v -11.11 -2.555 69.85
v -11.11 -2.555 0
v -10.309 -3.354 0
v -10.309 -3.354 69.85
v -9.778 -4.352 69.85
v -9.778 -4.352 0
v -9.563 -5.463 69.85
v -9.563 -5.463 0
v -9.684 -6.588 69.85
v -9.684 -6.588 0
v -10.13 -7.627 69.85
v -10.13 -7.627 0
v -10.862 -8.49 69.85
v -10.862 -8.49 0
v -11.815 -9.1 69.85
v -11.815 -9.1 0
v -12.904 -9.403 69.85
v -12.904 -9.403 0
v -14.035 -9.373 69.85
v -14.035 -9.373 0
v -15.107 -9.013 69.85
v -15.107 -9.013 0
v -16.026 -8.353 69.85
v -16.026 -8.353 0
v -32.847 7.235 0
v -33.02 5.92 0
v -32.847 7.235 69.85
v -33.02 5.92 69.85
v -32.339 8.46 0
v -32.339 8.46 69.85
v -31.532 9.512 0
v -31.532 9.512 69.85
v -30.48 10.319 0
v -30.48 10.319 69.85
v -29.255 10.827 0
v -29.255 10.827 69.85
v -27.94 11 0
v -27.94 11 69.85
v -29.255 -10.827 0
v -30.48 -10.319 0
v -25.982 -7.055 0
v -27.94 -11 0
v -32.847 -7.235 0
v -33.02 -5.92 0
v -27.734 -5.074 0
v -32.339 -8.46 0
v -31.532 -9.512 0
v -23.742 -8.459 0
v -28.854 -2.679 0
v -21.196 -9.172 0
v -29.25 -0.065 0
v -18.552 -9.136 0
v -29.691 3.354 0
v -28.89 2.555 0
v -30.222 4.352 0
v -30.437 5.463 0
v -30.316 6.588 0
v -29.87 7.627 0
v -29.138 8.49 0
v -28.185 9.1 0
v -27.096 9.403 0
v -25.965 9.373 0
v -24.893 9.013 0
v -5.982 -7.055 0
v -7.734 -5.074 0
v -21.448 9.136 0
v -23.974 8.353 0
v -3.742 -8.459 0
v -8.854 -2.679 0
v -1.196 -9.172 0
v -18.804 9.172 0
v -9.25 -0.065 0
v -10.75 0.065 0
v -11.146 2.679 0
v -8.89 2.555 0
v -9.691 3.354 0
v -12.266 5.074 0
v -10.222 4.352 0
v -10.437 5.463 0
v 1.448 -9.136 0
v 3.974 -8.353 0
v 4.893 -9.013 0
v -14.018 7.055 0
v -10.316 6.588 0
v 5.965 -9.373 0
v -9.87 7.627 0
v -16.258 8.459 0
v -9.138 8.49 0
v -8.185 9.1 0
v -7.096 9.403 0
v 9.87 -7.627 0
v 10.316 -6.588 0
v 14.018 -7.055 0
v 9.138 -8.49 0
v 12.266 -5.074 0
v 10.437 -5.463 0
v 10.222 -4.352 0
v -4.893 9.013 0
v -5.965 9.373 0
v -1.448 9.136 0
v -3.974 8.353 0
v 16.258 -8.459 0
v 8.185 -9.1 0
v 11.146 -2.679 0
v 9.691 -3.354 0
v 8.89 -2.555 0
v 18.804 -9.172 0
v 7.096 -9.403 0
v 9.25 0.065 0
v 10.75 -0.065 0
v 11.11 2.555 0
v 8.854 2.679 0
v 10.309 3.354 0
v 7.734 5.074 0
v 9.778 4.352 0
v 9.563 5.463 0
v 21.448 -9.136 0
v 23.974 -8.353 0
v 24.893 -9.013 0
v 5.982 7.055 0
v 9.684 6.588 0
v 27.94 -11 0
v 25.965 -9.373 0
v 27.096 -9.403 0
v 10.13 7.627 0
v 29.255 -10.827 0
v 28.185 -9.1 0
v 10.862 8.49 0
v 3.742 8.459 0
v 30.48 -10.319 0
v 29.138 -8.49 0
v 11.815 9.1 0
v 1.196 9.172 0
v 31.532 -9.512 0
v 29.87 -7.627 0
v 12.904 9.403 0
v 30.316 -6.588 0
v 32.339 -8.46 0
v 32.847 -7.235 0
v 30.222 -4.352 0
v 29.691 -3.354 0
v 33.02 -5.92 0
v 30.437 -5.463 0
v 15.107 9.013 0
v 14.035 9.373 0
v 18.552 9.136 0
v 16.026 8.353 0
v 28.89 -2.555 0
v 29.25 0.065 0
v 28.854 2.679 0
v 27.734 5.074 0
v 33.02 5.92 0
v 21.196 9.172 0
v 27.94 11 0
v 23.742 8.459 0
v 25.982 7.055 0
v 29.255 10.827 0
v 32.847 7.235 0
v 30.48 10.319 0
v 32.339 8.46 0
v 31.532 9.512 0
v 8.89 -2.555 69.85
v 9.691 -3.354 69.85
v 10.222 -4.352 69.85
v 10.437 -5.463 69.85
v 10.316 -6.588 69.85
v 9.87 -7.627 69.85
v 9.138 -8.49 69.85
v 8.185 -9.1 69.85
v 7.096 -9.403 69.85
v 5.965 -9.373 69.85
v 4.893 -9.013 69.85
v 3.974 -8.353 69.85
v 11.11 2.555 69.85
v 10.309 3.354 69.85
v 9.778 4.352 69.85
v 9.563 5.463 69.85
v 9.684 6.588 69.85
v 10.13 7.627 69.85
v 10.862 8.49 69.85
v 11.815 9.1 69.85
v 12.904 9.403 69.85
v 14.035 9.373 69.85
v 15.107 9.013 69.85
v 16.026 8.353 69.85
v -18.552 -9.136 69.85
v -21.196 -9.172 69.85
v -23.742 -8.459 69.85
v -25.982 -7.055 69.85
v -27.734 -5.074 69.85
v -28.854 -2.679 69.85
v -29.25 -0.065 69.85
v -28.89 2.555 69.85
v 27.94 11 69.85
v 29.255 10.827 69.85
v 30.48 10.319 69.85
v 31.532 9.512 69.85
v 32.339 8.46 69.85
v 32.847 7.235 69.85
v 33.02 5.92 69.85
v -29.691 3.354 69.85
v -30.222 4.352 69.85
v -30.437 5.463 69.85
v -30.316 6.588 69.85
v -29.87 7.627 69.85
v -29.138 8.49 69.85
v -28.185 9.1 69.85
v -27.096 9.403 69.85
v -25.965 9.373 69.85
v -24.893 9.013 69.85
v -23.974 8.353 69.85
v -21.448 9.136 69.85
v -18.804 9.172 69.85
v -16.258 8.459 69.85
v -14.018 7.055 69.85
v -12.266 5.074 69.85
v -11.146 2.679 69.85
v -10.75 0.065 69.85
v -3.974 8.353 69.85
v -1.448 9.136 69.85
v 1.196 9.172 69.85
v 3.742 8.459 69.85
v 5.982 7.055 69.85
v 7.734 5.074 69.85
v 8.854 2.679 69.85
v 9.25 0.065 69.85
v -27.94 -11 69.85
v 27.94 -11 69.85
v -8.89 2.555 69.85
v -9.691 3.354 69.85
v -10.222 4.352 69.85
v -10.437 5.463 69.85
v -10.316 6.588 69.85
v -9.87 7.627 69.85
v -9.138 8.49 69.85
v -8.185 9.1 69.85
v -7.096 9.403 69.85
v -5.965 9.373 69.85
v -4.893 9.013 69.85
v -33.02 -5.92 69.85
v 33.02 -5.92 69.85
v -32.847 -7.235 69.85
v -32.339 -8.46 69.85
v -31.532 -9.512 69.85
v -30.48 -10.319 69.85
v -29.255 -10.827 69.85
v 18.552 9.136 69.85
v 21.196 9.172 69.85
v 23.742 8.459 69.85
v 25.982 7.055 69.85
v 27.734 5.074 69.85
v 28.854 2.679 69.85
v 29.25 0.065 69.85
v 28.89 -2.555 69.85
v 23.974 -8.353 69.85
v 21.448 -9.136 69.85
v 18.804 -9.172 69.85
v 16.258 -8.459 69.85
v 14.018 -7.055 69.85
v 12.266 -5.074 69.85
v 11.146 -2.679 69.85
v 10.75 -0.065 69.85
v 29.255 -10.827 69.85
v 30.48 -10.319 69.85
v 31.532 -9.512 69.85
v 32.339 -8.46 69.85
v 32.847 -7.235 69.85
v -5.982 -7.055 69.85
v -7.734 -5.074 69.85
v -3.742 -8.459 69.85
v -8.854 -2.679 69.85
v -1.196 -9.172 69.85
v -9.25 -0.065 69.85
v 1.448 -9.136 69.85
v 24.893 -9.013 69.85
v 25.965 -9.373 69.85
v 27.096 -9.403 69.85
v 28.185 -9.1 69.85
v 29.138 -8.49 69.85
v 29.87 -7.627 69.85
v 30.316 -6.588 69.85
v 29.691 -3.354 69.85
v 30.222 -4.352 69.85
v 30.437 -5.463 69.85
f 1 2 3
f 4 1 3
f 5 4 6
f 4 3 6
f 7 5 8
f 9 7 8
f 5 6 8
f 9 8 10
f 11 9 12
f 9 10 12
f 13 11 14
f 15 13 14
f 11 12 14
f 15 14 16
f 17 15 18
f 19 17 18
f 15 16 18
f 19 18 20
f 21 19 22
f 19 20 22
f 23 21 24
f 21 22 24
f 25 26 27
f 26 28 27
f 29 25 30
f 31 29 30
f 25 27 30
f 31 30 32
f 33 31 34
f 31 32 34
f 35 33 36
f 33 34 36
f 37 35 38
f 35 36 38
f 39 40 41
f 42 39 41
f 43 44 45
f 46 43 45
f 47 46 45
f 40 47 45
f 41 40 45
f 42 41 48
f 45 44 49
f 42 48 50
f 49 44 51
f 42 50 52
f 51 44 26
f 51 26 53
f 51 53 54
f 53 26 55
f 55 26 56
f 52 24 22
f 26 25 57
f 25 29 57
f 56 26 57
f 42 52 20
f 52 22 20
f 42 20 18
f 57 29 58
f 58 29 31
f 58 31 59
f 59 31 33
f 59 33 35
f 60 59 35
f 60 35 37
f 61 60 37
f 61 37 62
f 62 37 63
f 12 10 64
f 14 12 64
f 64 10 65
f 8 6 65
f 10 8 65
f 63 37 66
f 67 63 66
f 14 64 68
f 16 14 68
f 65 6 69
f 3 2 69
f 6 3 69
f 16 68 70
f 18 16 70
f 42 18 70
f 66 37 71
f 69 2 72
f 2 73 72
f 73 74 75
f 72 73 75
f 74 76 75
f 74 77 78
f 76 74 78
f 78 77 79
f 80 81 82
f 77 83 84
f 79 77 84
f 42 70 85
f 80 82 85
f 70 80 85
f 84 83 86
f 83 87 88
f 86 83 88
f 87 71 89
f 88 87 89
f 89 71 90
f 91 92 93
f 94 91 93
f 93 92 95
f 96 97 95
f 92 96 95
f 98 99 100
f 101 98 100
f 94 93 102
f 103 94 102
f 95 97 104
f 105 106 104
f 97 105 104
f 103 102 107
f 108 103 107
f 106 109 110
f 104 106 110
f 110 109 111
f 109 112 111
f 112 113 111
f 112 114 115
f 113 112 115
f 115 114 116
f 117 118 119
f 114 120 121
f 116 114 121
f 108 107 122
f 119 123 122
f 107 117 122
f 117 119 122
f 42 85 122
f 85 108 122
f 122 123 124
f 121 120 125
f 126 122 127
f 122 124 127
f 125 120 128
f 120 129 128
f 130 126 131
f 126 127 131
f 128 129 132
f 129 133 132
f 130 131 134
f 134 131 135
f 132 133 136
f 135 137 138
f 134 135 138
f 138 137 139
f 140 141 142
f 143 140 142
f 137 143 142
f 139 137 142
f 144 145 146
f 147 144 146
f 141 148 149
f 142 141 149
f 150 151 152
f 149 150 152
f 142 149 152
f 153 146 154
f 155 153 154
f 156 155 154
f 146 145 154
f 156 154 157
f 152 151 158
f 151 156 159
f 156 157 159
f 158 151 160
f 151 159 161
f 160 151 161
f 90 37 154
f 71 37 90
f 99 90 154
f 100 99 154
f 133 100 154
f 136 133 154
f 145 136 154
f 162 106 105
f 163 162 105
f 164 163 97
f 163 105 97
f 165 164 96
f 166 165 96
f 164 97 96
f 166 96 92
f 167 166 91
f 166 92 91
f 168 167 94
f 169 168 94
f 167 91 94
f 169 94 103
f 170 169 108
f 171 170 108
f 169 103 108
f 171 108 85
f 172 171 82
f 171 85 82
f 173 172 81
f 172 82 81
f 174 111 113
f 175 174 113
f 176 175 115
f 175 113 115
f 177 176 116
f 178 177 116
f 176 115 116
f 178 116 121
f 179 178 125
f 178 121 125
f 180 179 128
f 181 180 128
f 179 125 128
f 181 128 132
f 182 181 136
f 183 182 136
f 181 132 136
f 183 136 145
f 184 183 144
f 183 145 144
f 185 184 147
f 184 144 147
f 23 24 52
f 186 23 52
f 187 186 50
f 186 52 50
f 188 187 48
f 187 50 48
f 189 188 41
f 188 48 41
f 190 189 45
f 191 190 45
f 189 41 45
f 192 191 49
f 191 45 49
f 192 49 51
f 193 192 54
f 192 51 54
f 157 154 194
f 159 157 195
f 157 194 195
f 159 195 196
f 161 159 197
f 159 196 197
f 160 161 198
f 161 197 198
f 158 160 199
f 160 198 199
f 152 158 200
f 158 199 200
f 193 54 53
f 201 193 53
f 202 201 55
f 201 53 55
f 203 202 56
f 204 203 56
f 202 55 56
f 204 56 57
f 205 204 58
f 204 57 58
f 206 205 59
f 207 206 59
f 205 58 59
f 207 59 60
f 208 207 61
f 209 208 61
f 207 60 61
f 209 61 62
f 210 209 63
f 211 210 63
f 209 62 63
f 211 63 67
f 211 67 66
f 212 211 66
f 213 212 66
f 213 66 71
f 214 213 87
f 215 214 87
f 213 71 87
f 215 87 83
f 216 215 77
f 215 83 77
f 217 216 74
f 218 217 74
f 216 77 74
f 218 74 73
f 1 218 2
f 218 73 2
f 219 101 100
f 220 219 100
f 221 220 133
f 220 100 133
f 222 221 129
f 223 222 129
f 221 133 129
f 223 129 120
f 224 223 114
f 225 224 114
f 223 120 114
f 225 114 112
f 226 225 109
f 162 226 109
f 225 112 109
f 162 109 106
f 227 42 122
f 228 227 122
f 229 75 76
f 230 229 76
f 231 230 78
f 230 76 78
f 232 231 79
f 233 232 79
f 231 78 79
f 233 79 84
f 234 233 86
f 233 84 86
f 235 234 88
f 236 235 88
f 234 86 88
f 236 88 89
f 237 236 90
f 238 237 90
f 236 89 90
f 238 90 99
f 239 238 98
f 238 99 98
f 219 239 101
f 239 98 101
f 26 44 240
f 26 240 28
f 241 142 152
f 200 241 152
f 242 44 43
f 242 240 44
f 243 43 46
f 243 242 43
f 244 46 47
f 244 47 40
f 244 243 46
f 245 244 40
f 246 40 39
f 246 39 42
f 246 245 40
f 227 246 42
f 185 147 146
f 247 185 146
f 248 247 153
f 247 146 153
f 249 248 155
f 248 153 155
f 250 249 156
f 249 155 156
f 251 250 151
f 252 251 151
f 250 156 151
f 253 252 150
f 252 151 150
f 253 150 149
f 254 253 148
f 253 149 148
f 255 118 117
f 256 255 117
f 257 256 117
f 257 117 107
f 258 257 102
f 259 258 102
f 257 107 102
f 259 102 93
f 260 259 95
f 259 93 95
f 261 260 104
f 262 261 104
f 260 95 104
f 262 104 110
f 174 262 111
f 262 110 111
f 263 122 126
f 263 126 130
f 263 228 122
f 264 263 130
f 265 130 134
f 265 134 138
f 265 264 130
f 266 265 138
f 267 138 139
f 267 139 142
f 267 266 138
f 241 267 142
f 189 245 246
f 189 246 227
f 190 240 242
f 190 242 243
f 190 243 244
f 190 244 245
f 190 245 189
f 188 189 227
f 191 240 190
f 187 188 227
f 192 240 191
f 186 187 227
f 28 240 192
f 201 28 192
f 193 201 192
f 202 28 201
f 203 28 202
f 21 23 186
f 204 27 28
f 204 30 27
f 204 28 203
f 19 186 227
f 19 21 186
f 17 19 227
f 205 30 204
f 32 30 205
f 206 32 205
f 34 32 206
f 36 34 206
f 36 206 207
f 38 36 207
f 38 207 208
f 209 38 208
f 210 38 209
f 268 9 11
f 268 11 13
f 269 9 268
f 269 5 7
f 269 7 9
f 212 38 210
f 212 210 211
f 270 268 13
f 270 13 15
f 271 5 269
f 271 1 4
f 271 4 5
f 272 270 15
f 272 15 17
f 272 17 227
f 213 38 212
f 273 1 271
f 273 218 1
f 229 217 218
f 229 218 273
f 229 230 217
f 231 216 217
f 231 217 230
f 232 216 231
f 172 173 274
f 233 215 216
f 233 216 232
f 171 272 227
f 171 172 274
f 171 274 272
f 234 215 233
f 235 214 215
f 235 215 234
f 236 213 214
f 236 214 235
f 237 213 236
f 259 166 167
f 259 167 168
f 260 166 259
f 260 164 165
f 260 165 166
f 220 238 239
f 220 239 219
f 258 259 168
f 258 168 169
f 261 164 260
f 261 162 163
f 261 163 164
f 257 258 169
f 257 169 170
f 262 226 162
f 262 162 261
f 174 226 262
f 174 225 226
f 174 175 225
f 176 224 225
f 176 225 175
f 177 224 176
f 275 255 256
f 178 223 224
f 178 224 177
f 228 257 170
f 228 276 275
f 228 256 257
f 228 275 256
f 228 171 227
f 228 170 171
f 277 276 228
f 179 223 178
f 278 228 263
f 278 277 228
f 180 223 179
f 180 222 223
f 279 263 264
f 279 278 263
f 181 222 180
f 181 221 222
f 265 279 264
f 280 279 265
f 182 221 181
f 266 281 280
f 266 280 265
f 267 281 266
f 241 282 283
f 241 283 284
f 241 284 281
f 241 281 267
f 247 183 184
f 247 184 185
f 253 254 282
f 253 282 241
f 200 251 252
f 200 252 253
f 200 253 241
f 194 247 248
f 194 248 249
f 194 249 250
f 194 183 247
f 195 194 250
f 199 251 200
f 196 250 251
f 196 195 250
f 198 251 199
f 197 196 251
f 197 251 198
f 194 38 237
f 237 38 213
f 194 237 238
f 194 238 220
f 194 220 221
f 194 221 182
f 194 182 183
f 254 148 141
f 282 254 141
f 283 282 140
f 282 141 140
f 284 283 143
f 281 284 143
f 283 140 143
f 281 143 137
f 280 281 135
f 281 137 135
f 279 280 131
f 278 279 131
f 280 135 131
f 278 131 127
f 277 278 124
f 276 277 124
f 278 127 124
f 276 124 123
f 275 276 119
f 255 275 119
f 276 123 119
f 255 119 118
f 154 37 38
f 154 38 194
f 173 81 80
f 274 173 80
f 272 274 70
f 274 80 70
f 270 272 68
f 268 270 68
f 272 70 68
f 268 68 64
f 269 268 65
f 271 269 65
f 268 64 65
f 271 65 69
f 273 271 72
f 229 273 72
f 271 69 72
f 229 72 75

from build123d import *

# Parameters (mm, degrees)
F0_W     = 66.04
F0_H     = 22
F1_DEPTH = 69.85
F2_R     = 5.08


with BuildPart() as f1:
    # F0 (on Top) → F1 (new body)
    with BuildSketch(Plane.XY):
        Rectangle(F0_W, F0_H)
        with BuildLine():
            ThreePointArc((-23.97354, 8.353052), (-14.017672, 7.055087), (-11.109783, -2.554711))
            ThreePointArc((-11.109783, -2.554711), (-10.464057, -8.085959), (-16.02646, -8.353052))
            ThreePointArc((-16.02646, -8.353052), (-25.982328, -7.055087), (-28.890217, 2.554711))
            ThreePointArc((-28.890217, 2.554711), (-29.535943, 8.085959), (-23.97354, 8.353052))
        make_face(mode=Mode.SUBTRACT)
        with BuildLine():
            ThreePointArc((3.97354, -8.353052), (-5.982328, -7.055087), (-8.890217, 2.554711))
            ThreePointArc((-8.890217, 2.554711), (-9.535943, 8.085959), (-3.97354, 8.353052))
            ThreePointArc((-3.97354, 8.353052), (5.982328, 7.055087), (8.890217, -2.554711))
            ThreePointArc((8.890217, -2.554711), (9.535943, -8.085959), (3.97354, -8.353052))
        make_face(mode=Mode.SUBTRACT)
        with BuildLine():
            ThreePointArc((16.02646, 8.353052), (25.982328, 7.055087), (28.890217, -2.554711))
            ThreePointArc((28.890217, -2.554711), (29.535943, -8.085959), (23.97354, -8.353052))
            ThreePointArc((23.97354, -8.353052), (14.017672, -7.055087), (11.109783, 2.554711))
            ThreePointArc((11.109783, 2.554711), (10.464057, 8.085959), (16.02646, 8.353052))
        make_face(mode=Mode.SUBTRACT)
    extrude(amount=F1_DEPTH)

    # F2
    f2_edges = [f1.edges().sort_by_distance(p)[0] for p in [
        (-33.02, 11, 34.925),
        (-33.02, -11, 34.925),
        (33.02, -11, 34.925),
        (33.02, 11, 34.925),
    ]]
    fillet(f2_edges, radius=F2_R)


solid = f1.part
